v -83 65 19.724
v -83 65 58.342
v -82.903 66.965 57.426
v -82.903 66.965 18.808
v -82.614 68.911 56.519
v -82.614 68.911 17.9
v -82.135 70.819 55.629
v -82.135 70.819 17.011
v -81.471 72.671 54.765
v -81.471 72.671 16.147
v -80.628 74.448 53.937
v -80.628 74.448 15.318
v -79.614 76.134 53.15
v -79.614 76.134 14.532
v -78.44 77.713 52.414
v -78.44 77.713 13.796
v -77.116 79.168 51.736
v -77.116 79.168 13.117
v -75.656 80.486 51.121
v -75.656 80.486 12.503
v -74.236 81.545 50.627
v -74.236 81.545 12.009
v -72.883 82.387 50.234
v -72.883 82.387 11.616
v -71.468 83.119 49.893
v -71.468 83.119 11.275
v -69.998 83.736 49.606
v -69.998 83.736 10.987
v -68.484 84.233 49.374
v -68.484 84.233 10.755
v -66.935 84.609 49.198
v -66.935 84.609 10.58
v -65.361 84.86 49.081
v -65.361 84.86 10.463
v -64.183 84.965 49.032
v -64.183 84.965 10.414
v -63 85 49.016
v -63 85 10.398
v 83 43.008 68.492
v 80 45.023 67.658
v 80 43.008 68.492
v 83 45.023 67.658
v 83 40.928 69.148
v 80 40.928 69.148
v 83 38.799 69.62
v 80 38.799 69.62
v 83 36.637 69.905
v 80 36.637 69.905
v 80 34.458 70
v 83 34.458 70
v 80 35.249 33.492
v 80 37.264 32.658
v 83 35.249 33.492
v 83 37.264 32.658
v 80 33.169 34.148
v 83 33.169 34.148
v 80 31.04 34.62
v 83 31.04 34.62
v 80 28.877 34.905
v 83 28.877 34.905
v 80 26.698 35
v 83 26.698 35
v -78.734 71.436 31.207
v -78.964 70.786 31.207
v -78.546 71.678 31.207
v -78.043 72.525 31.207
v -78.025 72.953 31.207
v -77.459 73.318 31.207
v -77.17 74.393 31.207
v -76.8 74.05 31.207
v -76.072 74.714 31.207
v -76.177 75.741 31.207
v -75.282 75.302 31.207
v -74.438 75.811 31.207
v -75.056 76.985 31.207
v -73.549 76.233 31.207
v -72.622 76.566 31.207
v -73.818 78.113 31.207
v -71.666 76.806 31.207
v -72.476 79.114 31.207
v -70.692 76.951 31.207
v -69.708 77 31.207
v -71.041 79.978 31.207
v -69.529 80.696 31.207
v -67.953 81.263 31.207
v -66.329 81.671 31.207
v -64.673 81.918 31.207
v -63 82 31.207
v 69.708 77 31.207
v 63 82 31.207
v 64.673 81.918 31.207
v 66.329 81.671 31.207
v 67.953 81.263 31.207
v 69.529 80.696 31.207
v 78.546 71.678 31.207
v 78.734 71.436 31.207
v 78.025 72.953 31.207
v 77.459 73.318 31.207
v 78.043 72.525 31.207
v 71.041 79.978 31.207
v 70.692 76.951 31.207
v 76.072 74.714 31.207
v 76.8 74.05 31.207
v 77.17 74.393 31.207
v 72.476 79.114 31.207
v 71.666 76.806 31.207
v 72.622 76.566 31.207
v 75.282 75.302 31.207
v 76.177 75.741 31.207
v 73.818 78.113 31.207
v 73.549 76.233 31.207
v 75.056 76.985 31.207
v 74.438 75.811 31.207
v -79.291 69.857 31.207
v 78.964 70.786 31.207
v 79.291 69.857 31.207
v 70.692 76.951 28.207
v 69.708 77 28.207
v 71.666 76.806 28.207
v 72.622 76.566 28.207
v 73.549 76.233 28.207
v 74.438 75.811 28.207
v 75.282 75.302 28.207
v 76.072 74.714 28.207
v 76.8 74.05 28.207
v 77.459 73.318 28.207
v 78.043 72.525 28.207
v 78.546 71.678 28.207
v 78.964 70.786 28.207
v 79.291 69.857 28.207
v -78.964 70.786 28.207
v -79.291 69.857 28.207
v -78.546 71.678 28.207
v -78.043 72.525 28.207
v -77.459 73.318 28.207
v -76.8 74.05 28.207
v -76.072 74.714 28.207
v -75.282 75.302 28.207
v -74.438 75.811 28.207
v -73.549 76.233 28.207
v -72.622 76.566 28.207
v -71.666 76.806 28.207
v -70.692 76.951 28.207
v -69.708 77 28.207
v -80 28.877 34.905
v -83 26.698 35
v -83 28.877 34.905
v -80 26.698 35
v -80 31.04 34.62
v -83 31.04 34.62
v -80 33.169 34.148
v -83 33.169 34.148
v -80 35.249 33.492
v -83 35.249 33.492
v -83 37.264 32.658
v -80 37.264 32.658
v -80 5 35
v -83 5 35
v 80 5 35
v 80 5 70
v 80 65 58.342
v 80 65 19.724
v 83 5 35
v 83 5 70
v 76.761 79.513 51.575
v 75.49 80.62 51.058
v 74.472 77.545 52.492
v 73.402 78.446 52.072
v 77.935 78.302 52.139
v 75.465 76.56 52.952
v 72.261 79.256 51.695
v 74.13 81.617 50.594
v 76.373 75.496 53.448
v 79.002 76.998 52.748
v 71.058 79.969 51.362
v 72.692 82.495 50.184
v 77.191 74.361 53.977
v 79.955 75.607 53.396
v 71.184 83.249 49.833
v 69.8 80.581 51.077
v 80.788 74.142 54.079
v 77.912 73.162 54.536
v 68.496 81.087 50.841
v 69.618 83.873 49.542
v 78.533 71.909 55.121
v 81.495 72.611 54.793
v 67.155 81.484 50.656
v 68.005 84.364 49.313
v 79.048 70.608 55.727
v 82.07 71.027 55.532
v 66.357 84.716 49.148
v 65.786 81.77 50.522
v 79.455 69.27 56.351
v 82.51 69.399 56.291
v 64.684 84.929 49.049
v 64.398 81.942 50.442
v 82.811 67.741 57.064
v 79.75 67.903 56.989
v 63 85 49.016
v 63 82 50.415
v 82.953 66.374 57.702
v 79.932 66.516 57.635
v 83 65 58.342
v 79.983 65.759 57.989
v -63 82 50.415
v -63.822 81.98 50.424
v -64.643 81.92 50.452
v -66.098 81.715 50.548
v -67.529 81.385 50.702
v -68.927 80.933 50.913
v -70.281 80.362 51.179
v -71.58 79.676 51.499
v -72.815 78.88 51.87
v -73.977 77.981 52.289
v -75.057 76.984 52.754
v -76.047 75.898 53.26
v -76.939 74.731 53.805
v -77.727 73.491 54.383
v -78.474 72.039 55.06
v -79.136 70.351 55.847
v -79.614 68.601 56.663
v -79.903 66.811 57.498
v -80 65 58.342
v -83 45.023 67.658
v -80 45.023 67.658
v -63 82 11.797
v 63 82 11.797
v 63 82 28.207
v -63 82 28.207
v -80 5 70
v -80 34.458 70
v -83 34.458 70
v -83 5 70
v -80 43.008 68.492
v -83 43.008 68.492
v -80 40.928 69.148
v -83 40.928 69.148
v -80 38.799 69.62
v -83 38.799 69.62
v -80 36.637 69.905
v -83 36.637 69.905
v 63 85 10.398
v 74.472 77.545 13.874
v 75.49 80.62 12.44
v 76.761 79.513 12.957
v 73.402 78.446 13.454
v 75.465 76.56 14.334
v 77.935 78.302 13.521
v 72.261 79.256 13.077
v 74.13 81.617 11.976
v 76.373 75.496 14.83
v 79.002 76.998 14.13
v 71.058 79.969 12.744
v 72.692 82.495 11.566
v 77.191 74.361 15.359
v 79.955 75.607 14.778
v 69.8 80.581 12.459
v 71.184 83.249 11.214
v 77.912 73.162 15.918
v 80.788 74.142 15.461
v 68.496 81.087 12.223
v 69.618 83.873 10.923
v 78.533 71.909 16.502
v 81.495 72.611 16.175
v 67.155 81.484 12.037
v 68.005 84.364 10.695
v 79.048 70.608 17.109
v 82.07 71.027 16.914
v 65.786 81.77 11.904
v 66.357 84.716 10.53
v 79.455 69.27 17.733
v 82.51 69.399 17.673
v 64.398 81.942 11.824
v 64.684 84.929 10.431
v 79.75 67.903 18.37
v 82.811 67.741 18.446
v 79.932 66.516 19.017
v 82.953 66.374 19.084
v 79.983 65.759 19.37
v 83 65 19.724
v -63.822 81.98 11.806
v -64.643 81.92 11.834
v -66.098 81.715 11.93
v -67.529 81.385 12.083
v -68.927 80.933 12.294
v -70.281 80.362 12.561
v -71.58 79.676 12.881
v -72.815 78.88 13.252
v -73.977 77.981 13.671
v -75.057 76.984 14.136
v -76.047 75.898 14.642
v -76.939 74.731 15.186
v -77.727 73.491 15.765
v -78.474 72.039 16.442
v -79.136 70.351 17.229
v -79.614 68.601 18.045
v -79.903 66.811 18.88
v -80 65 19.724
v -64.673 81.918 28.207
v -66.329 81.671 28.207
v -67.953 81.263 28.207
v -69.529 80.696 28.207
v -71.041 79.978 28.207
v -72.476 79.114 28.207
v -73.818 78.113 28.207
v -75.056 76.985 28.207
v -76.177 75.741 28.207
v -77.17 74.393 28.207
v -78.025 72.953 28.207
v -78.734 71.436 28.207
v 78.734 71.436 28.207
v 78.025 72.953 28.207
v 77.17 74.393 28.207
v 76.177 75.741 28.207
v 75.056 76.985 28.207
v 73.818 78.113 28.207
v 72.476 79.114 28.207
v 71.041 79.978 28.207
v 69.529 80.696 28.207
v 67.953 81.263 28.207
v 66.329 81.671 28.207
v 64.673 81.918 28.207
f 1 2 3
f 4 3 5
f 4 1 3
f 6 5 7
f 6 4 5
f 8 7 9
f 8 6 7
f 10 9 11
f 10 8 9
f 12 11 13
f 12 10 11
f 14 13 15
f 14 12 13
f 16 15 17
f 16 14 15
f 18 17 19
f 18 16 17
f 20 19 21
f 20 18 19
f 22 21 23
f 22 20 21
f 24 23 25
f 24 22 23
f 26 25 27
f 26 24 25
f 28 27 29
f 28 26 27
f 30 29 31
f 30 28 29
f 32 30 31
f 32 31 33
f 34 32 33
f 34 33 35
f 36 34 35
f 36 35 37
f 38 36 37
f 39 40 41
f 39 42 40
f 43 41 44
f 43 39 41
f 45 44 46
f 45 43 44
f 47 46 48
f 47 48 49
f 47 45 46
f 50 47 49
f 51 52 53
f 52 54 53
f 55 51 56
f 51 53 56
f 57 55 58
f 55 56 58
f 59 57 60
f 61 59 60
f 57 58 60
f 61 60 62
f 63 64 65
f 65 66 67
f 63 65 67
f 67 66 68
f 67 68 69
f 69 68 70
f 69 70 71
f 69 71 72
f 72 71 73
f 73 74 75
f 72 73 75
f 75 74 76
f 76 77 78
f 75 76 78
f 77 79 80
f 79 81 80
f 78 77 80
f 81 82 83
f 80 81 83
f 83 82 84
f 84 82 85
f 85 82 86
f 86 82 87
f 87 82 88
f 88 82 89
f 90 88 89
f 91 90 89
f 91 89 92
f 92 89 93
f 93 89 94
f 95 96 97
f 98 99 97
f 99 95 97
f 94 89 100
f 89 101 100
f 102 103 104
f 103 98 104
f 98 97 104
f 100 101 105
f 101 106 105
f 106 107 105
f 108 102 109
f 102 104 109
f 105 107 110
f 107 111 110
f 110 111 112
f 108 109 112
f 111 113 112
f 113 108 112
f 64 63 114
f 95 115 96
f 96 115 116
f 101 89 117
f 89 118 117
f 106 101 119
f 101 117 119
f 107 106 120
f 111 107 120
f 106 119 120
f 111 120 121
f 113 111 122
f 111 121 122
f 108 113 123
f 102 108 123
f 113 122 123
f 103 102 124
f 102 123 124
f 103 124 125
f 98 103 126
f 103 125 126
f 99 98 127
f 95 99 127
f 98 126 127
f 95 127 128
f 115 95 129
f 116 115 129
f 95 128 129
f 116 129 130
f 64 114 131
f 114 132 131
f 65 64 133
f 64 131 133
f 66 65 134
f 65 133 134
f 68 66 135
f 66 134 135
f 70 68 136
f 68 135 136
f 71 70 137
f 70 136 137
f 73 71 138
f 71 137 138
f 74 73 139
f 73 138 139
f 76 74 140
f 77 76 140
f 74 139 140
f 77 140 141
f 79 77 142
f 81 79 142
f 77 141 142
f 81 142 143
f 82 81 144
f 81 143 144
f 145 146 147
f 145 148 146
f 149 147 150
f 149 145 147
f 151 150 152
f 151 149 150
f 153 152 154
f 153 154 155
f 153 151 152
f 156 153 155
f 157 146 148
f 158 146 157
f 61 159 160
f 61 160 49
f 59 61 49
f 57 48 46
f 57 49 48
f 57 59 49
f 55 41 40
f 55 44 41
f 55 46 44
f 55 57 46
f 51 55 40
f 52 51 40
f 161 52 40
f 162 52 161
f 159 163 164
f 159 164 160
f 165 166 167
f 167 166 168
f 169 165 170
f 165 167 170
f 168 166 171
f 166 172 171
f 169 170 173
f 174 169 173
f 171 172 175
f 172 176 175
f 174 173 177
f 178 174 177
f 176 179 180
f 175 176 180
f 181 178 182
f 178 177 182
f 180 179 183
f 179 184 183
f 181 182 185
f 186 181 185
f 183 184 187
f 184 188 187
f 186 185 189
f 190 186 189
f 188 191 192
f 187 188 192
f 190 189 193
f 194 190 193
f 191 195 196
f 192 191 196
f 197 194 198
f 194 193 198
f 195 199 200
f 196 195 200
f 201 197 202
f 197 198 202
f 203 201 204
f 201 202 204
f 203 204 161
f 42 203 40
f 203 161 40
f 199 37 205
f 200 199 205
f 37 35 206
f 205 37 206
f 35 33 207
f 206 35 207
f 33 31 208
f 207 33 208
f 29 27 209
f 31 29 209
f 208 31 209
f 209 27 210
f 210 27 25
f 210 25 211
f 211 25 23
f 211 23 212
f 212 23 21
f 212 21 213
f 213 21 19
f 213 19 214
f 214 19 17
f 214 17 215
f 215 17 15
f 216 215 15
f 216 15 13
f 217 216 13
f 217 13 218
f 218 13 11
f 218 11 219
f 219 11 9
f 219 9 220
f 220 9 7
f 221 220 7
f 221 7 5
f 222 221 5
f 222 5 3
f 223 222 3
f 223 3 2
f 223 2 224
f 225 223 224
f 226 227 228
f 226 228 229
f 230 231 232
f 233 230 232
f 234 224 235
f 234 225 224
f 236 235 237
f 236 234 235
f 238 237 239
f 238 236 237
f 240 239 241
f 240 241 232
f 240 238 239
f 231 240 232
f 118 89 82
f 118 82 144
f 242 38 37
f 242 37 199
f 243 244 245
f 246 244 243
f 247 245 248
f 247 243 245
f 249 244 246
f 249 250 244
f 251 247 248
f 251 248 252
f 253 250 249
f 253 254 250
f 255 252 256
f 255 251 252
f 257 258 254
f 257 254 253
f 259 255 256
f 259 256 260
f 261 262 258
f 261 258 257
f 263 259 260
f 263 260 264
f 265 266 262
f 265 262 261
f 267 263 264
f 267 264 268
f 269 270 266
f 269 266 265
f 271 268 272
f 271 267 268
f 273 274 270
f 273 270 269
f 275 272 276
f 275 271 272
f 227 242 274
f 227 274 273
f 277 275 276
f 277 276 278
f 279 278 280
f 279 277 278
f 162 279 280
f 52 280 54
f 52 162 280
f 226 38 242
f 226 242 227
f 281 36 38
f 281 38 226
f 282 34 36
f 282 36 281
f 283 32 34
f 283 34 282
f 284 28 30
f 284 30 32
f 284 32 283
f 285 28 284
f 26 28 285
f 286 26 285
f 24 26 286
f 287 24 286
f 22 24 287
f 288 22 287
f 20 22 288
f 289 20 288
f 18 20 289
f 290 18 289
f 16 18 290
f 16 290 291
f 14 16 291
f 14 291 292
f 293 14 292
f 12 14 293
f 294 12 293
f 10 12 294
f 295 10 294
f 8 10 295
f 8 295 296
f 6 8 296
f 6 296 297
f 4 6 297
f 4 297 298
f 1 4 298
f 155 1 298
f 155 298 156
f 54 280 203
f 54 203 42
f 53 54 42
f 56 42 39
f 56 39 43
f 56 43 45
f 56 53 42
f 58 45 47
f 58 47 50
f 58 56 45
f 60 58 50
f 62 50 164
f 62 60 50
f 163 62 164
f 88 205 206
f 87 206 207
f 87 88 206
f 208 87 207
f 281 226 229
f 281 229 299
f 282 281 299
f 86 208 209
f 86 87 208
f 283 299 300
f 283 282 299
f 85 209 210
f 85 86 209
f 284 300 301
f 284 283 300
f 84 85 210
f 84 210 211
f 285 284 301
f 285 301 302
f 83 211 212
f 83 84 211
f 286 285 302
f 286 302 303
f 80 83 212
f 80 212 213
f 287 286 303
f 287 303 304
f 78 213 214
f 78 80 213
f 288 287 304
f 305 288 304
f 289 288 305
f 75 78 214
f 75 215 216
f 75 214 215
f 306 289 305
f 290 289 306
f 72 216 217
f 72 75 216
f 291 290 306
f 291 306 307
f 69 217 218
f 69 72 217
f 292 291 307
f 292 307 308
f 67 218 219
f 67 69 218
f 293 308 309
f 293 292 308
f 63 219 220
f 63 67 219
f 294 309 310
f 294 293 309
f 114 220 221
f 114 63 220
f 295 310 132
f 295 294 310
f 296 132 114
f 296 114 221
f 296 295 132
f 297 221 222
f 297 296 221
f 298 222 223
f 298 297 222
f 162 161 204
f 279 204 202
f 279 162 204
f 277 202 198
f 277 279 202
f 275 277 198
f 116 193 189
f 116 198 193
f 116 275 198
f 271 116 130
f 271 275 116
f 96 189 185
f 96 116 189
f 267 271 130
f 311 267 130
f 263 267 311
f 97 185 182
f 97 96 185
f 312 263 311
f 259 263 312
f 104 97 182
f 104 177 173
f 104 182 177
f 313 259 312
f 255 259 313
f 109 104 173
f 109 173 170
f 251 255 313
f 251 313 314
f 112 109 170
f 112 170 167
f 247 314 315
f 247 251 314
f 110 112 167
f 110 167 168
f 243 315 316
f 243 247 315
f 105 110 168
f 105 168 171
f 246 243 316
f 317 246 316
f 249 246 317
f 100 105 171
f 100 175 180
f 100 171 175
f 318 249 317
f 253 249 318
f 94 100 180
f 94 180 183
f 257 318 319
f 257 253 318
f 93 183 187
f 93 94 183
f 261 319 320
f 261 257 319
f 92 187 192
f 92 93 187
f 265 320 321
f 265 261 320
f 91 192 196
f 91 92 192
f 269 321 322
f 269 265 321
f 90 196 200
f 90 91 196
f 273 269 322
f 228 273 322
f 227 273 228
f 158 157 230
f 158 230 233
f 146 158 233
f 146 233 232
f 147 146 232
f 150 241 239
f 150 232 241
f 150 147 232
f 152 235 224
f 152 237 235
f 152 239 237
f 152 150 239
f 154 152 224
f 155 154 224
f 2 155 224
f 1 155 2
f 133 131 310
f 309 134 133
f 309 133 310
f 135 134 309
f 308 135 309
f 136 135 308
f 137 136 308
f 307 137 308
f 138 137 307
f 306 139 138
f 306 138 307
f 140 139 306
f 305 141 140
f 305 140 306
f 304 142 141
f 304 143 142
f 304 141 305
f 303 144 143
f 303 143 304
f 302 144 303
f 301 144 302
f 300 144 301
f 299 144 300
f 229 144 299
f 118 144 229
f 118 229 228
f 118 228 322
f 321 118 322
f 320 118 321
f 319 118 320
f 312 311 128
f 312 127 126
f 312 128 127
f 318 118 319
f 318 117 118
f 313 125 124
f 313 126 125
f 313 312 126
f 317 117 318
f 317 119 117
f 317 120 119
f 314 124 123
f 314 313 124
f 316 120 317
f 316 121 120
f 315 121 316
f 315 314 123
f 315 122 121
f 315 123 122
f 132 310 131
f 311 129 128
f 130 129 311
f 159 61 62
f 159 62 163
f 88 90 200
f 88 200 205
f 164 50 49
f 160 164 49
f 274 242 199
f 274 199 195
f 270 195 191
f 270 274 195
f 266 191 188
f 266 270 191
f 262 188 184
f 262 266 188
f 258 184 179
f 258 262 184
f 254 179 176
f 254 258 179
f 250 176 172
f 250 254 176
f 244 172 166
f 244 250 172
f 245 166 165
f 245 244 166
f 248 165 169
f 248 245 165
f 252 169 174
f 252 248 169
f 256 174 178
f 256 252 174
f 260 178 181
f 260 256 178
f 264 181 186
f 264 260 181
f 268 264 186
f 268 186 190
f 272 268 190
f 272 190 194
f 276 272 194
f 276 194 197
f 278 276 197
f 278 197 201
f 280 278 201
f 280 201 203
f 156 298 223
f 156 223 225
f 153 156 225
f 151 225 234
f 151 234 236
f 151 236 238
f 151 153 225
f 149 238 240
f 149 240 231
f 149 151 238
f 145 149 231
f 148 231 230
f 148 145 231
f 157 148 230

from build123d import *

# Parameters (mm, degrees)
BOSS_EXTRUDE1_DEPTH             = 70
CUT_EXTRUDE1_DEPTH              = 200.200903612
FILLET1_R                       = 25
BOSS_EXTRUDE2_REACH             = 139.891
SKETCH3_W                       = 3
SKETCH3_H                       = 8
BOSS_EXTRUDE2_DIRECTION_2_REACH = 139.891
FILLET2_R                       = 10


with BuildPart() as part:
    # Sketch1 → Boss-Extrude1 (new body)
    with BuildSketch(Plane.XY):
        with BuildLine():
            Line((-83, 5), (-83, 65))
            ThreePointArc((-83, 65), (-77.142135624, 79.142135624), (-63, 85))
            Line((-63, 85), (63, 85))
            ThreePointArc((63, 85), (77.142135624, 79.142135624), (83, 65))
            Line((83, 65), (83, 5))
            Line((83, 5), (80, 5))
            Line((80, 5), (80, 65))
            ThreePointArc((80, 65), (75.02081528, 77.02081528), (63, 82))
            Line((63, 82), (-63, 82))
            ThreePointArc((-63, 82), (-75.02081528, 77.02081528), (-80, 65))
            Line((-80, 65), (-80, 5))
            Line((-80, 5), (-83, 5))
        make_face()
    extrude(amount=BOSS_EXTRUDE1_DEPTH)

    # Sketch2 → Cut-Extrude1 (cut, through all)
    with BuildSketch(Plane.ZY.offset(83)):
        Polygon((49.016155383, 85), (70, 40), (70, 85), align=None)
        Polygon((10.397928219, 85), (35, 32.240686807), (35, 4.870884332), (0, 4.870884332), (0, 85), align=None)
    extrude(amount=-CUT_EXTRUDE1_DEPTH, mode=Mode.SUBTRACT)

    # Fillet1
    fillet1_edges = [part.edges().sort_by_distance(p)[0] for p in [
        (-81.5, 40, 70),
        (81.5, 40, 70),
        (-81.5, 32.240686807, 35),
        (81.5, 32.240686807, 35),
    ]]
    fillet(fillet1_edges, radius=FILLET1_R)

    # Sketch3 → Boss-Extrude2 (add, up to next)
    with BuildSketch(Plane(origin=(0, 0, 0), x_dir=(0, 0, -1), z_dir=(1, 0, 0)), mode=Mode.PRIVATE) as boss_extrude2_sk1:
        with Locations((-29.707041801, 81)):
            Rectangle(SKETCH3_W, SKETCH3_H)
    boss_extrude2_tool1 = extrude(boss_extrude2_sk1.sketch, amount=BOSS_EXTRUDE2_REACH, mode=Mode.PRIVATE) - part.part
    add(boss_extrude2_tool1.solids().sort_by_distance((0, 81, 29.707042))[0])

    # Sketch3 → Boss-Extrude2 direction 2 (add, up to next)
    with BuildSketch(Plane(origin=(0, 0, 0), x_dir=(0, 0, -1), z_dir=(1, 0, 0)), mode=Mode.PRIVATE) as boss_extrude2_direction_2_sk1:
        with Locations((-29.707041801, 81)):
            Rectangle(SKETCH3_W, SKETCH3_H)
    boss_extrude2_direction_2_tool1 = extrude(boss_extrude2_direction_2_sk1.sketch, amount=-BOSS_EXTRUDE2_DIRECTION_2_REACH, mode=Mode.PRIVATE) - part.part
    add(boss_extrude2_direction_2_tool1.solids().sort_by_distance((0, 81, 29.707042))[0])

    # Fillet2
    fillet2_edges = [part.edges().sort_by_distance(p)[0] for p in [
        (-75.041594579, 77, 29.707041801),
        (75.041594579, 77, 29.707041801),
    ]]
    fillet(fillet2_edges, radius=FILLET2_R)


solid = part.part
